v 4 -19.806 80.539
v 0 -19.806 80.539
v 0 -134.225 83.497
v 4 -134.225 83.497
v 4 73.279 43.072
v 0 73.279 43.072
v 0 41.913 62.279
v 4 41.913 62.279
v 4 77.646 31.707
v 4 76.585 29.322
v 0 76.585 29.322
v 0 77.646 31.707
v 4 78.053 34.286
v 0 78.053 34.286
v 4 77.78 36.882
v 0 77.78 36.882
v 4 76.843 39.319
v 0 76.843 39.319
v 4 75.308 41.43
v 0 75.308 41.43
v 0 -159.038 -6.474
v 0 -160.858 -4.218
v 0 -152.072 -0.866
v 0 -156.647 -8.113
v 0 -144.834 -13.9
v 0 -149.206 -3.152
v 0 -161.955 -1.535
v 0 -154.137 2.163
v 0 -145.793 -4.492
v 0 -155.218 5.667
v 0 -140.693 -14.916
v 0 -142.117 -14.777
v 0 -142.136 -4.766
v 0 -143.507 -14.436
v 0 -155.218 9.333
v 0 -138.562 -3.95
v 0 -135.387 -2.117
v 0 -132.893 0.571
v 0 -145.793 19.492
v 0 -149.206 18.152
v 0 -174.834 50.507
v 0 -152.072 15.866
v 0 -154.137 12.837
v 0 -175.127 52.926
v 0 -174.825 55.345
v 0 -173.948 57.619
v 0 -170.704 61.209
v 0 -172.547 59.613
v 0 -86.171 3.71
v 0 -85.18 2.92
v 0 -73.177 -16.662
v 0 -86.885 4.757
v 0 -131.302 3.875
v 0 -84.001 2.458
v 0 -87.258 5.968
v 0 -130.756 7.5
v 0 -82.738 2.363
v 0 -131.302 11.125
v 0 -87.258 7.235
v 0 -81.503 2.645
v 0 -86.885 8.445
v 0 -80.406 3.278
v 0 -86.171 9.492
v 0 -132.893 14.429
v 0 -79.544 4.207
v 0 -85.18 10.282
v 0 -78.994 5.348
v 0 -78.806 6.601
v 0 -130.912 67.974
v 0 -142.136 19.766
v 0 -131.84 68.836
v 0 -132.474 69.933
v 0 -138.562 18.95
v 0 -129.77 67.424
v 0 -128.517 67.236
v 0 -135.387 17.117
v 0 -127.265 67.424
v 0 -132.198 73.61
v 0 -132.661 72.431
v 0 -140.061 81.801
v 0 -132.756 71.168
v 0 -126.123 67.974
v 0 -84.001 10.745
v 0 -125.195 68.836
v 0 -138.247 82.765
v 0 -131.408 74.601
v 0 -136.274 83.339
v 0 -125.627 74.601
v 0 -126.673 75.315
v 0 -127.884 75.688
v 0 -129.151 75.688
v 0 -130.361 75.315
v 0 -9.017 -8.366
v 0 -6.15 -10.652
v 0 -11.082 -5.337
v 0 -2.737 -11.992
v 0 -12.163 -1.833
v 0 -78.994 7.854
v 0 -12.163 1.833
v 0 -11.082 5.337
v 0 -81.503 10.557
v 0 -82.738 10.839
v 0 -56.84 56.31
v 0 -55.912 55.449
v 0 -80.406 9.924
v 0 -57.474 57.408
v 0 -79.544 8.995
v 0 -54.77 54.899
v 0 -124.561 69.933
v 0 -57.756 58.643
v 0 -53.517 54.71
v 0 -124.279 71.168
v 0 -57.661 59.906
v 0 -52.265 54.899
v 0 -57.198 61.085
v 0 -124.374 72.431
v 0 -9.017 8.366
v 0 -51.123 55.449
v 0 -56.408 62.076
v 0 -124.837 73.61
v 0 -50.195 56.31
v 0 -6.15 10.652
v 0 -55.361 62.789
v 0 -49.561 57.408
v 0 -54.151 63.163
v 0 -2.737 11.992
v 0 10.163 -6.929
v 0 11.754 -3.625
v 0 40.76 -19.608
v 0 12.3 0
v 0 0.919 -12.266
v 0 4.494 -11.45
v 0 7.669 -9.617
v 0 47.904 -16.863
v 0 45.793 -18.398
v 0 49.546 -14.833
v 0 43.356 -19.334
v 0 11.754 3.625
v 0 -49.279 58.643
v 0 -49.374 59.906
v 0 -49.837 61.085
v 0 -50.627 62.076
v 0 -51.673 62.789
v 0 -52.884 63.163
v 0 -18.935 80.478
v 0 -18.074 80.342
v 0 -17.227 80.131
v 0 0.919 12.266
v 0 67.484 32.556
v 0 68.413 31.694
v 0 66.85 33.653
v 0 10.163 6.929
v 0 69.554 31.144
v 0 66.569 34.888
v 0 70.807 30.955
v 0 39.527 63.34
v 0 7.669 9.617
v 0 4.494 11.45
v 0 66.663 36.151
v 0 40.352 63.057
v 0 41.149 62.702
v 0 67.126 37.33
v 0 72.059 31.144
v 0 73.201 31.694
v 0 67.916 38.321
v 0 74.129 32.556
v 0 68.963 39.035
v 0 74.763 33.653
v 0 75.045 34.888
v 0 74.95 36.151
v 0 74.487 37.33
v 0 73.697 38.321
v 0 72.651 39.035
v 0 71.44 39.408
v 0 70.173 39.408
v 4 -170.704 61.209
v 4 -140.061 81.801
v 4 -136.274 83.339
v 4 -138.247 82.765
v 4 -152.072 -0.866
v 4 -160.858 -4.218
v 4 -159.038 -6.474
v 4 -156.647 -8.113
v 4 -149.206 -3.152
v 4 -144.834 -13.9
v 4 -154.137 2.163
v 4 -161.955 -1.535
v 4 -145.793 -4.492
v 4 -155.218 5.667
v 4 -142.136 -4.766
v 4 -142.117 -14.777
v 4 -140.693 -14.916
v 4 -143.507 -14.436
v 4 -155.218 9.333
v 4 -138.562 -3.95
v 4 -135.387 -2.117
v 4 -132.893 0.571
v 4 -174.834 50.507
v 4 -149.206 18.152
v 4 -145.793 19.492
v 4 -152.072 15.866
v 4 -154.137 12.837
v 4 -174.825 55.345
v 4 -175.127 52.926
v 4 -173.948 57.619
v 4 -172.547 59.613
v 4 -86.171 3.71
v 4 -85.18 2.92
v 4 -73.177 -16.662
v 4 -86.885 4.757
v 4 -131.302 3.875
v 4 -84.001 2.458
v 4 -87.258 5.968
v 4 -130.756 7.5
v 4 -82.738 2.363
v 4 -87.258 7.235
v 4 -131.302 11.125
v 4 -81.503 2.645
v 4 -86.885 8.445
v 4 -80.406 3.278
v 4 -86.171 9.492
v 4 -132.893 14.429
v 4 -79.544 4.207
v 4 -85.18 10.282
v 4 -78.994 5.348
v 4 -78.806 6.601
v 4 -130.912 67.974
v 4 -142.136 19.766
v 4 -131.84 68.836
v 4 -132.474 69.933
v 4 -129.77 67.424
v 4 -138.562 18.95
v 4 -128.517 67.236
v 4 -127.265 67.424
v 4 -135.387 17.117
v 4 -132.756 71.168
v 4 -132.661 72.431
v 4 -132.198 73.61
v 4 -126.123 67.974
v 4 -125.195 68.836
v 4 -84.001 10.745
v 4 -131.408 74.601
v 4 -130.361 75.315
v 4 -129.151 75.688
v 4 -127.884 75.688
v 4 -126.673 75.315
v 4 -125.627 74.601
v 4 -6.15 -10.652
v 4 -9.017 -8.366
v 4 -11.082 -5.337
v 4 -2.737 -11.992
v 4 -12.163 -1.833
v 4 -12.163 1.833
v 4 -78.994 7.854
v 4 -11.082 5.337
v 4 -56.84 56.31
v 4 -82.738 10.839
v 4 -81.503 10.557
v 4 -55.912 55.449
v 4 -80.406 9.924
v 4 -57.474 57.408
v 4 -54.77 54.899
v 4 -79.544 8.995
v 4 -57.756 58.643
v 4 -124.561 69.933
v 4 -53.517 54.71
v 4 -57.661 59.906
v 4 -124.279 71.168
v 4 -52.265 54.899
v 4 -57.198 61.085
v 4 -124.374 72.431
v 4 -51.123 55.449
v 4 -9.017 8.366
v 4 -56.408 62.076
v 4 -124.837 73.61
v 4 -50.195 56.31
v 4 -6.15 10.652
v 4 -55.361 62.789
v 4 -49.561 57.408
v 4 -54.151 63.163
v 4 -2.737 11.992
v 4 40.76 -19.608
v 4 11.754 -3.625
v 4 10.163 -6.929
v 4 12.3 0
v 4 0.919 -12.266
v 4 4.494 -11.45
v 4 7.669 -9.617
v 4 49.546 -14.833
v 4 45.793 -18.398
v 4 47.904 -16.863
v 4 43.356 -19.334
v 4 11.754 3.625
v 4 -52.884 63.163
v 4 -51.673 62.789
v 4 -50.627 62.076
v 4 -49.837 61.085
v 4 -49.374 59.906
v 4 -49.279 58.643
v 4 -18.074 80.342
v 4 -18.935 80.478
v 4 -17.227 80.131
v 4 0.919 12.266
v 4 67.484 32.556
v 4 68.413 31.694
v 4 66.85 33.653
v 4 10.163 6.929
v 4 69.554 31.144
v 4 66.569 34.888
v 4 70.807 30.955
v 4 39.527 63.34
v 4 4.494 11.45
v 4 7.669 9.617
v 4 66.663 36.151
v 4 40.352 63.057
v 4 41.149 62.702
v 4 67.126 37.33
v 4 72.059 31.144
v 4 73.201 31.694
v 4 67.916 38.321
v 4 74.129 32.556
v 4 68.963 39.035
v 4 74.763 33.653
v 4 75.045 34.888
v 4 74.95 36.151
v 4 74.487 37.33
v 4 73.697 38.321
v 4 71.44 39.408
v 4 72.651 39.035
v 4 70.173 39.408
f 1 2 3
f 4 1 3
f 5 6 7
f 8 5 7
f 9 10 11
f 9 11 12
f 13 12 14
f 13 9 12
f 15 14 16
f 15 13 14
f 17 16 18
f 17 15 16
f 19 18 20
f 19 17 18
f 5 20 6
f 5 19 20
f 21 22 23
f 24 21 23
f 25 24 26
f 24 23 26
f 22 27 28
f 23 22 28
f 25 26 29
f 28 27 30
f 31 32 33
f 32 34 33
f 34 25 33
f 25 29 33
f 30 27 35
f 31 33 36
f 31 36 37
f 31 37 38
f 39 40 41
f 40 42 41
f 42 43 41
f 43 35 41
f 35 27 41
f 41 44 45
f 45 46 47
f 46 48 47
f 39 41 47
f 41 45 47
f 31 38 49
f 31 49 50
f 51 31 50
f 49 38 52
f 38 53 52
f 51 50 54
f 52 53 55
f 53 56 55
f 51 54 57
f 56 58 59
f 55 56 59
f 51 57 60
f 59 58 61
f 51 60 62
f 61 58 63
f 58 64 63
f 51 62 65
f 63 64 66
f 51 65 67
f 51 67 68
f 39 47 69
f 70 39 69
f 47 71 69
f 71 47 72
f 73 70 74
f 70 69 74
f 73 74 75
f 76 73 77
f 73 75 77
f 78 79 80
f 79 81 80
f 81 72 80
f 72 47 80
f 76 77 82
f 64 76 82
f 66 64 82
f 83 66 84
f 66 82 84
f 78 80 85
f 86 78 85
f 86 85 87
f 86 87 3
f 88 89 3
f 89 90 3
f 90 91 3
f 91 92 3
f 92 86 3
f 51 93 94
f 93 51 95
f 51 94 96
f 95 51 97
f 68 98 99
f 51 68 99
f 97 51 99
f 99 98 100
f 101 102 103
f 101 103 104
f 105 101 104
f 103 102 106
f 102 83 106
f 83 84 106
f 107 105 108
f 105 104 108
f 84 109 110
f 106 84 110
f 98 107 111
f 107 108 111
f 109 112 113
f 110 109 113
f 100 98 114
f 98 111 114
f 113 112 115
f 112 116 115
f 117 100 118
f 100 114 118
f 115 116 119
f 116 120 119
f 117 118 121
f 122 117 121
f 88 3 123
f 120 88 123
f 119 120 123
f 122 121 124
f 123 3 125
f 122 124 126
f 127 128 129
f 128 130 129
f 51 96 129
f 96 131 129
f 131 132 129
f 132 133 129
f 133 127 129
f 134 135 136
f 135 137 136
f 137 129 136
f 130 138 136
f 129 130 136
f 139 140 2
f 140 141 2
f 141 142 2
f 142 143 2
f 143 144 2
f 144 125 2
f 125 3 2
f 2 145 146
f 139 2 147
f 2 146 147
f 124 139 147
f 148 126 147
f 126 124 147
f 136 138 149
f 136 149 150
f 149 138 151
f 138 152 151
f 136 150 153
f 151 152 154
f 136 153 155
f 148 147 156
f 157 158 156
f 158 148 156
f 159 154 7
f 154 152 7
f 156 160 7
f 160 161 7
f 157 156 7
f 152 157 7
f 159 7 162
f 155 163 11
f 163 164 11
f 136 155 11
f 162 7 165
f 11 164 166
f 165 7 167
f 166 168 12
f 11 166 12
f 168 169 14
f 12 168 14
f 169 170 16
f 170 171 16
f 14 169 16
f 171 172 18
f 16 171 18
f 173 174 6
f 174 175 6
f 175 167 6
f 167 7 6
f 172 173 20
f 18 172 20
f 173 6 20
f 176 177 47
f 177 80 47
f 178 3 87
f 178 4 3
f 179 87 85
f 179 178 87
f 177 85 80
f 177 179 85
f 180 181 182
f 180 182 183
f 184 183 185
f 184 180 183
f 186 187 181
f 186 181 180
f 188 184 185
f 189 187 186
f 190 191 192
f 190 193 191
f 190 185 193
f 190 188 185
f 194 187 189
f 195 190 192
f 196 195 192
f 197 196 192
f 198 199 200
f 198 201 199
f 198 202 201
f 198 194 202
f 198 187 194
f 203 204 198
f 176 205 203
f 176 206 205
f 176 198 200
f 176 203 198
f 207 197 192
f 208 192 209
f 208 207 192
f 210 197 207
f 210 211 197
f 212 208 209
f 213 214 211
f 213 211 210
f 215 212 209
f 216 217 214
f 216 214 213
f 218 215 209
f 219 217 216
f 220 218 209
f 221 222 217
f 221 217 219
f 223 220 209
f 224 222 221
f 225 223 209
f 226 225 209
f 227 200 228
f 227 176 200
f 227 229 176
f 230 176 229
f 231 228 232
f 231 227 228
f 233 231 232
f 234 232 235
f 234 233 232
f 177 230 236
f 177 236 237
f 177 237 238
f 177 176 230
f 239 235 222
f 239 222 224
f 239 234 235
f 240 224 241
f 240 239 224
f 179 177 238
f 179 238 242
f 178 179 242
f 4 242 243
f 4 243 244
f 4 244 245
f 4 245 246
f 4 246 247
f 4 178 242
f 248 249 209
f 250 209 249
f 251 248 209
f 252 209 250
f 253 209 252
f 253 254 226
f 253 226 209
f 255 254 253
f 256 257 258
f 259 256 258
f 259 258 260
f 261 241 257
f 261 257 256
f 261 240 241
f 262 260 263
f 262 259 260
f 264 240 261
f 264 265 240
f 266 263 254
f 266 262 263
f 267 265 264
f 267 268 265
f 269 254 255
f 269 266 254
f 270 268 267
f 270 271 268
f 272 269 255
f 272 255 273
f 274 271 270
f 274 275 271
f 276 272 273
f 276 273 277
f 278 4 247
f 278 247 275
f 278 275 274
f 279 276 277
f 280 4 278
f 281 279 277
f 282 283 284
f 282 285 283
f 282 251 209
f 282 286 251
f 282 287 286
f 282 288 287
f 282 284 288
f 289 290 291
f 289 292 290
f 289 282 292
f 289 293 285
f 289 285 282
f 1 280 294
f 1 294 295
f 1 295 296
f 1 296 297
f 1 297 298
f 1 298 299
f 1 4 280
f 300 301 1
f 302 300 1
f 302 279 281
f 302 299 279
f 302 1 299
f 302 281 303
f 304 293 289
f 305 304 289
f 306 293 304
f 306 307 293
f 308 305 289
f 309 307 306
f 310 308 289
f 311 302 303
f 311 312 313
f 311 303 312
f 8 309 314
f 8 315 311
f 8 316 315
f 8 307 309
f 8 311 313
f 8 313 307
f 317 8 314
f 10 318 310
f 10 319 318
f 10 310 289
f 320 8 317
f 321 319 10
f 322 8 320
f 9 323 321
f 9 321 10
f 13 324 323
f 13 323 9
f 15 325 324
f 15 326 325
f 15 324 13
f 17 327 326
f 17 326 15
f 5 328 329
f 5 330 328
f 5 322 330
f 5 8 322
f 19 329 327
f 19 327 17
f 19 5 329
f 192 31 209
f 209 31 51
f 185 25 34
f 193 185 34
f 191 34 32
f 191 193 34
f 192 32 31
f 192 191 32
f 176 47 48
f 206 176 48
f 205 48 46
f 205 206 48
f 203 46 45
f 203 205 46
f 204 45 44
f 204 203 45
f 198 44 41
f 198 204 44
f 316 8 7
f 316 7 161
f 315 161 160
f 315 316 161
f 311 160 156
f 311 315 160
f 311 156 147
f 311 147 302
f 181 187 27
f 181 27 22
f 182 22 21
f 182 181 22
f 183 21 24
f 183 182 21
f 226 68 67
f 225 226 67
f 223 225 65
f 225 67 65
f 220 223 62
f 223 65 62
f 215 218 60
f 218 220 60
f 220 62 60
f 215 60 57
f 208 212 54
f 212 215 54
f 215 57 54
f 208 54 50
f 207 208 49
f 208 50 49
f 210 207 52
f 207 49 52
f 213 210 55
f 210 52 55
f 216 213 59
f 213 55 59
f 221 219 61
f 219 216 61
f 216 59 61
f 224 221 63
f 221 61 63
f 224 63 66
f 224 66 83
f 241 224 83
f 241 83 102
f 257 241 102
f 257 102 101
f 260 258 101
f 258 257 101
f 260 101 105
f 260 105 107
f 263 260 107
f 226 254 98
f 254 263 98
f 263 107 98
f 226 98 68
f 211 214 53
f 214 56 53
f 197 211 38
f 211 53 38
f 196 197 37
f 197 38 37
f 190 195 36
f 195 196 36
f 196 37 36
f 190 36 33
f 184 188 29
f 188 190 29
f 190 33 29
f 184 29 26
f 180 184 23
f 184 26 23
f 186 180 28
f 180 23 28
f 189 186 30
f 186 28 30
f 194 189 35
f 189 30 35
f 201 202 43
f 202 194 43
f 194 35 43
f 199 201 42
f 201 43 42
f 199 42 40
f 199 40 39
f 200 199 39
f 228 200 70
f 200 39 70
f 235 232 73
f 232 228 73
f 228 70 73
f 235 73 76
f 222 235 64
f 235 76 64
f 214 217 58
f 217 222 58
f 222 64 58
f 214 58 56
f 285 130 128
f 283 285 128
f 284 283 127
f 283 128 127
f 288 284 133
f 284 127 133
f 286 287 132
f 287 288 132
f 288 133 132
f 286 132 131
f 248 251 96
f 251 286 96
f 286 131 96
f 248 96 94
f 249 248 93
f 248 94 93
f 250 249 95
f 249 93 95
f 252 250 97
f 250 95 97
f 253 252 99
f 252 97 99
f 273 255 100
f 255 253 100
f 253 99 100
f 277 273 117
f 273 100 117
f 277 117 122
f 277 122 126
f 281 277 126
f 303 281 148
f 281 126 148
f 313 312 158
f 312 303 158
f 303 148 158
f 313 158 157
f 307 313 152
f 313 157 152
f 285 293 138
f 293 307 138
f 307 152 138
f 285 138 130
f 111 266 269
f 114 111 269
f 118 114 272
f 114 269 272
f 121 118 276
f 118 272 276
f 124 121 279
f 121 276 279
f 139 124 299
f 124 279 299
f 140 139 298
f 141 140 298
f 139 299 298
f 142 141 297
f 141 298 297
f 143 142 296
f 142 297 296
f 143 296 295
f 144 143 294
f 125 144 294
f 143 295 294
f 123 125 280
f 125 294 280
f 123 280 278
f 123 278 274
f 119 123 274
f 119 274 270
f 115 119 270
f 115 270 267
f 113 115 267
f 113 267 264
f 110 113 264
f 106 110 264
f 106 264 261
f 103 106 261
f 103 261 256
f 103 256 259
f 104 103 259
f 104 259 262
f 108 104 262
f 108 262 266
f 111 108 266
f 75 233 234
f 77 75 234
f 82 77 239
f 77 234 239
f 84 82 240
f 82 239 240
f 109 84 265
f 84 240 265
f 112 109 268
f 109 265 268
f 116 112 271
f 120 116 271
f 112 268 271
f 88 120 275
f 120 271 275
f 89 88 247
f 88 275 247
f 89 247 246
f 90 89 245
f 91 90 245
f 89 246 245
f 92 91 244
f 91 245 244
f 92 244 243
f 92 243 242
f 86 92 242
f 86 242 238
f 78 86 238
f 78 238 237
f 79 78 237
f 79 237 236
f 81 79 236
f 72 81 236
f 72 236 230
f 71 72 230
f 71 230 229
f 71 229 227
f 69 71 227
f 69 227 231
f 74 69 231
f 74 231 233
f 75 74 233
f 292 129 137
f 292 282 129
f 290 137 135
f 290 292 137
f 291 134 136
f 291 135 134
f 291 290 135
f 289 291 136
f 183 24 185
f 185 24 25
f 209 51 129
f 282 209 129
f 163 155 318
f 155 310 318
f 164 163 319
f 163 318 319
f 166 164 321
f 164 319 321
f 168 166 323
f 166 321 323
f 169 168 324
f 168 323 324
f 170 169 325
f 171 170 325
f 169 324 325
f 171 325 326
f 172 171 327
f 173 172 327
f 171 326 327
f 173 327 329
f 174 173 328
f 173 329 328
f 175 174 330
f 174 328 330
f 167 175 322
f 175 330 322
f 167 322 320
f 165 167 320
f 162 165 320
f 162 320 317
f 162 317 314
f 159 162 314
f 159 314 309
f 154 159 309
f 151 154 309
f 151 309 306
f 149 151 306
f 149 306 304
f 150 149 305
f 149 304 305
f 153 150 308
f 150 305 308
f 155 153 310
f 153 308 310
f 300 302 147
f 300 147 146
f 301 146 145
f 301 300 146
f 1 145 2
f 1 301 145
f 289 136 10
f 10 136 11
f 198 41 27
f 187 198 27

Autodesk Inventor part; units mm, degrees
ref_plane "YZ Plane" through (0, 0, 0) normal (1, 0, 0) x (0, 1, 0)
ref_plane "XZ Plane" through (0, 0, 0) normal (0, 1, 0) x (-1, 0, 0)
ref_plane "XY Plane" through (0, 0, 0) normal (0, 0, 1) x (1, 0, 0)
sketch "Sketch1" plane through (0, 0, 0) normal (1, 0, 0) x (0, 1, 0)
  circle A0 centre (0, 0) radius 62.5 construction
  circle A1 centre (-143.0555, 7.5) radius 50 construction
  line L0 (-143.0555, 7.5) -> (0, 0) construction
  line L1 (-161.7434, -42.5) -> (-102.4467, -42.5) construction
  line L2 (-16.0459, -62.5) -> (40.9165, -62.5) construction
  line L3 (-160.8345, -6.0612) -> (-142.874, -14.8599)
  line L4 (-142.874, -14.8599) -> (-73.1769, -16.662)
  line L5 (46.5314, -19.7571) -> (81.8069, 37.8501)
  line L6 (81.8069, 37.8501) -> (13.4998, 79.6777)
  line L7 (13.4998, 79.6777) -> (-137.4135, 83.5796)
  line L8 (-137.4135, 83.5796) -> (-176.516, 57.3036)
  line L9 (-176.516, 57.3036) -> (-160.8345, -6.0612)
  circle A2 centre (0, 0) radius 12.3
  circle A3 centre (-143.0555, 7.5) radius 12.3
  line L10 (-151.8542, -10.4606) -> (-143.0555, 7.5) construction
  arc A4 (-61.867, -16.9544) -> (-73.1769, -16.662) centre (-67.341, -9.8105) ccw construction
  line L11 (-98.4698, -16.008) -> (-97.8311, -16.0245) construction
  line L12 (-97.8311, -16.0245) -> (-61.867, -16.9544) construction
  line L13 (-61.867, -16.9544) -> (-98.4698, -16.008) construction
  line L14 (-73.1769, -16.662) -> (46.5314, -19.7571)
  line L15 (0, 0) -> (-212.6616, 0) construction
  circle A5 centre (-83.0555, 6.6011) radius 4.25
  dimension "d0" = 125
  dimension "d1" = 100
  dimension "d2" = 143.252
  dimension "d3" = 20
  dimension "d4" = 20
  dimension "d5" = 24.6
  dimension "d6" = 24.6
  dimension "d7" = 23.099
  dimension "d8" = 20
  dimension "d9" = 130
  dimension "d10" = 110
  dimension "d12" = 155.381
  dimension "d13" = 80
  dimension "d14" = 90
  dimension "d15" = 150
  dimension "Height" = 75
  dimension "d17" = 50
  dimension "d18" = 60
  dimension "d30" = 8.5
  dimension "d31" = 23
  dimension "d32" = 60
extrude "Extrusion1" add sketch "Sketch1" along normal blind 4
fillet "Fillet3" radius 10 6 edges at (2, 81.8069, 37.8501) (2, 46.5314, -19.7571) (2, -142.874, -14.8599) (2, -160.8345, -6.0612) (2, -176.516, 57.3036) (2, -137.4135, 83.5796)
chamfer "Chamfer1" distance 32 angle 45 1 edges at (2, 13.4998, 79.6777)
fillet "Fillet4" radius 10 2 edges at (2, 40.7898, 62.9668) (2, -18.4895, 80.5048)
sketch "Sketch2" plane through (4, 0, 0) normal (1, 0, 0) x (0, 0, -1)
  circle A0 centre (0, 0) radius 16.3
  circle A1 centre (0, 0) radius 12.3 projected
  circle A2 centre (-71.4855, -128.5174) radius 4.25
  line L0 (-81.8006, -140.0609) -> (-61.209, -170.7042) projected
  line L1 (-50.5066, -174.8339) -> (1.5347, -161.9548) projected
  circle A3 centre (-35.2054, 70.8067) radius 4.25
  arc A4 (-29.322, 76.5847) -> (-43.0723, 73.2788) centre (-34.5442, 68.0566) ccw projected
  line L2 (14.8333, 49.5464) -> (-29.322, 76.5847) projected
  line L3 (-43.0723, 73.2788) -> (-62.2792, 41.9126) projected
  circle A5 centre (-58.9603, -53.5174) radius 4.25
  line L4 (-58.9603, -53.5174) -> (-71.4855, -128.5174)
  line L5 (-80.5388, -19.8056) -> (-83.4971, -134.225) projected
  point P0 (18.0192, 10.7846)
  point P1 (18.8908, -9.1727)
  dimension "d39" = 32.6
  dimension "d42" = 8.5
  dimension "d43" = 15
  dimension "d44" = 50
  dimension "d45" = 8.5
  dimension "d47" = 8
  dimension "d48" = 8
  dimension "d49" = 8.5
  dimension "d50" = 8
  dimension "d51" = 75
extrude "Extrusion2" cut sketch "Sketch2" against normal blind 9.5 contours A1 | A2 | A5 | A3
properties part number "Module Plate 1" material "Aluminum 6061"
